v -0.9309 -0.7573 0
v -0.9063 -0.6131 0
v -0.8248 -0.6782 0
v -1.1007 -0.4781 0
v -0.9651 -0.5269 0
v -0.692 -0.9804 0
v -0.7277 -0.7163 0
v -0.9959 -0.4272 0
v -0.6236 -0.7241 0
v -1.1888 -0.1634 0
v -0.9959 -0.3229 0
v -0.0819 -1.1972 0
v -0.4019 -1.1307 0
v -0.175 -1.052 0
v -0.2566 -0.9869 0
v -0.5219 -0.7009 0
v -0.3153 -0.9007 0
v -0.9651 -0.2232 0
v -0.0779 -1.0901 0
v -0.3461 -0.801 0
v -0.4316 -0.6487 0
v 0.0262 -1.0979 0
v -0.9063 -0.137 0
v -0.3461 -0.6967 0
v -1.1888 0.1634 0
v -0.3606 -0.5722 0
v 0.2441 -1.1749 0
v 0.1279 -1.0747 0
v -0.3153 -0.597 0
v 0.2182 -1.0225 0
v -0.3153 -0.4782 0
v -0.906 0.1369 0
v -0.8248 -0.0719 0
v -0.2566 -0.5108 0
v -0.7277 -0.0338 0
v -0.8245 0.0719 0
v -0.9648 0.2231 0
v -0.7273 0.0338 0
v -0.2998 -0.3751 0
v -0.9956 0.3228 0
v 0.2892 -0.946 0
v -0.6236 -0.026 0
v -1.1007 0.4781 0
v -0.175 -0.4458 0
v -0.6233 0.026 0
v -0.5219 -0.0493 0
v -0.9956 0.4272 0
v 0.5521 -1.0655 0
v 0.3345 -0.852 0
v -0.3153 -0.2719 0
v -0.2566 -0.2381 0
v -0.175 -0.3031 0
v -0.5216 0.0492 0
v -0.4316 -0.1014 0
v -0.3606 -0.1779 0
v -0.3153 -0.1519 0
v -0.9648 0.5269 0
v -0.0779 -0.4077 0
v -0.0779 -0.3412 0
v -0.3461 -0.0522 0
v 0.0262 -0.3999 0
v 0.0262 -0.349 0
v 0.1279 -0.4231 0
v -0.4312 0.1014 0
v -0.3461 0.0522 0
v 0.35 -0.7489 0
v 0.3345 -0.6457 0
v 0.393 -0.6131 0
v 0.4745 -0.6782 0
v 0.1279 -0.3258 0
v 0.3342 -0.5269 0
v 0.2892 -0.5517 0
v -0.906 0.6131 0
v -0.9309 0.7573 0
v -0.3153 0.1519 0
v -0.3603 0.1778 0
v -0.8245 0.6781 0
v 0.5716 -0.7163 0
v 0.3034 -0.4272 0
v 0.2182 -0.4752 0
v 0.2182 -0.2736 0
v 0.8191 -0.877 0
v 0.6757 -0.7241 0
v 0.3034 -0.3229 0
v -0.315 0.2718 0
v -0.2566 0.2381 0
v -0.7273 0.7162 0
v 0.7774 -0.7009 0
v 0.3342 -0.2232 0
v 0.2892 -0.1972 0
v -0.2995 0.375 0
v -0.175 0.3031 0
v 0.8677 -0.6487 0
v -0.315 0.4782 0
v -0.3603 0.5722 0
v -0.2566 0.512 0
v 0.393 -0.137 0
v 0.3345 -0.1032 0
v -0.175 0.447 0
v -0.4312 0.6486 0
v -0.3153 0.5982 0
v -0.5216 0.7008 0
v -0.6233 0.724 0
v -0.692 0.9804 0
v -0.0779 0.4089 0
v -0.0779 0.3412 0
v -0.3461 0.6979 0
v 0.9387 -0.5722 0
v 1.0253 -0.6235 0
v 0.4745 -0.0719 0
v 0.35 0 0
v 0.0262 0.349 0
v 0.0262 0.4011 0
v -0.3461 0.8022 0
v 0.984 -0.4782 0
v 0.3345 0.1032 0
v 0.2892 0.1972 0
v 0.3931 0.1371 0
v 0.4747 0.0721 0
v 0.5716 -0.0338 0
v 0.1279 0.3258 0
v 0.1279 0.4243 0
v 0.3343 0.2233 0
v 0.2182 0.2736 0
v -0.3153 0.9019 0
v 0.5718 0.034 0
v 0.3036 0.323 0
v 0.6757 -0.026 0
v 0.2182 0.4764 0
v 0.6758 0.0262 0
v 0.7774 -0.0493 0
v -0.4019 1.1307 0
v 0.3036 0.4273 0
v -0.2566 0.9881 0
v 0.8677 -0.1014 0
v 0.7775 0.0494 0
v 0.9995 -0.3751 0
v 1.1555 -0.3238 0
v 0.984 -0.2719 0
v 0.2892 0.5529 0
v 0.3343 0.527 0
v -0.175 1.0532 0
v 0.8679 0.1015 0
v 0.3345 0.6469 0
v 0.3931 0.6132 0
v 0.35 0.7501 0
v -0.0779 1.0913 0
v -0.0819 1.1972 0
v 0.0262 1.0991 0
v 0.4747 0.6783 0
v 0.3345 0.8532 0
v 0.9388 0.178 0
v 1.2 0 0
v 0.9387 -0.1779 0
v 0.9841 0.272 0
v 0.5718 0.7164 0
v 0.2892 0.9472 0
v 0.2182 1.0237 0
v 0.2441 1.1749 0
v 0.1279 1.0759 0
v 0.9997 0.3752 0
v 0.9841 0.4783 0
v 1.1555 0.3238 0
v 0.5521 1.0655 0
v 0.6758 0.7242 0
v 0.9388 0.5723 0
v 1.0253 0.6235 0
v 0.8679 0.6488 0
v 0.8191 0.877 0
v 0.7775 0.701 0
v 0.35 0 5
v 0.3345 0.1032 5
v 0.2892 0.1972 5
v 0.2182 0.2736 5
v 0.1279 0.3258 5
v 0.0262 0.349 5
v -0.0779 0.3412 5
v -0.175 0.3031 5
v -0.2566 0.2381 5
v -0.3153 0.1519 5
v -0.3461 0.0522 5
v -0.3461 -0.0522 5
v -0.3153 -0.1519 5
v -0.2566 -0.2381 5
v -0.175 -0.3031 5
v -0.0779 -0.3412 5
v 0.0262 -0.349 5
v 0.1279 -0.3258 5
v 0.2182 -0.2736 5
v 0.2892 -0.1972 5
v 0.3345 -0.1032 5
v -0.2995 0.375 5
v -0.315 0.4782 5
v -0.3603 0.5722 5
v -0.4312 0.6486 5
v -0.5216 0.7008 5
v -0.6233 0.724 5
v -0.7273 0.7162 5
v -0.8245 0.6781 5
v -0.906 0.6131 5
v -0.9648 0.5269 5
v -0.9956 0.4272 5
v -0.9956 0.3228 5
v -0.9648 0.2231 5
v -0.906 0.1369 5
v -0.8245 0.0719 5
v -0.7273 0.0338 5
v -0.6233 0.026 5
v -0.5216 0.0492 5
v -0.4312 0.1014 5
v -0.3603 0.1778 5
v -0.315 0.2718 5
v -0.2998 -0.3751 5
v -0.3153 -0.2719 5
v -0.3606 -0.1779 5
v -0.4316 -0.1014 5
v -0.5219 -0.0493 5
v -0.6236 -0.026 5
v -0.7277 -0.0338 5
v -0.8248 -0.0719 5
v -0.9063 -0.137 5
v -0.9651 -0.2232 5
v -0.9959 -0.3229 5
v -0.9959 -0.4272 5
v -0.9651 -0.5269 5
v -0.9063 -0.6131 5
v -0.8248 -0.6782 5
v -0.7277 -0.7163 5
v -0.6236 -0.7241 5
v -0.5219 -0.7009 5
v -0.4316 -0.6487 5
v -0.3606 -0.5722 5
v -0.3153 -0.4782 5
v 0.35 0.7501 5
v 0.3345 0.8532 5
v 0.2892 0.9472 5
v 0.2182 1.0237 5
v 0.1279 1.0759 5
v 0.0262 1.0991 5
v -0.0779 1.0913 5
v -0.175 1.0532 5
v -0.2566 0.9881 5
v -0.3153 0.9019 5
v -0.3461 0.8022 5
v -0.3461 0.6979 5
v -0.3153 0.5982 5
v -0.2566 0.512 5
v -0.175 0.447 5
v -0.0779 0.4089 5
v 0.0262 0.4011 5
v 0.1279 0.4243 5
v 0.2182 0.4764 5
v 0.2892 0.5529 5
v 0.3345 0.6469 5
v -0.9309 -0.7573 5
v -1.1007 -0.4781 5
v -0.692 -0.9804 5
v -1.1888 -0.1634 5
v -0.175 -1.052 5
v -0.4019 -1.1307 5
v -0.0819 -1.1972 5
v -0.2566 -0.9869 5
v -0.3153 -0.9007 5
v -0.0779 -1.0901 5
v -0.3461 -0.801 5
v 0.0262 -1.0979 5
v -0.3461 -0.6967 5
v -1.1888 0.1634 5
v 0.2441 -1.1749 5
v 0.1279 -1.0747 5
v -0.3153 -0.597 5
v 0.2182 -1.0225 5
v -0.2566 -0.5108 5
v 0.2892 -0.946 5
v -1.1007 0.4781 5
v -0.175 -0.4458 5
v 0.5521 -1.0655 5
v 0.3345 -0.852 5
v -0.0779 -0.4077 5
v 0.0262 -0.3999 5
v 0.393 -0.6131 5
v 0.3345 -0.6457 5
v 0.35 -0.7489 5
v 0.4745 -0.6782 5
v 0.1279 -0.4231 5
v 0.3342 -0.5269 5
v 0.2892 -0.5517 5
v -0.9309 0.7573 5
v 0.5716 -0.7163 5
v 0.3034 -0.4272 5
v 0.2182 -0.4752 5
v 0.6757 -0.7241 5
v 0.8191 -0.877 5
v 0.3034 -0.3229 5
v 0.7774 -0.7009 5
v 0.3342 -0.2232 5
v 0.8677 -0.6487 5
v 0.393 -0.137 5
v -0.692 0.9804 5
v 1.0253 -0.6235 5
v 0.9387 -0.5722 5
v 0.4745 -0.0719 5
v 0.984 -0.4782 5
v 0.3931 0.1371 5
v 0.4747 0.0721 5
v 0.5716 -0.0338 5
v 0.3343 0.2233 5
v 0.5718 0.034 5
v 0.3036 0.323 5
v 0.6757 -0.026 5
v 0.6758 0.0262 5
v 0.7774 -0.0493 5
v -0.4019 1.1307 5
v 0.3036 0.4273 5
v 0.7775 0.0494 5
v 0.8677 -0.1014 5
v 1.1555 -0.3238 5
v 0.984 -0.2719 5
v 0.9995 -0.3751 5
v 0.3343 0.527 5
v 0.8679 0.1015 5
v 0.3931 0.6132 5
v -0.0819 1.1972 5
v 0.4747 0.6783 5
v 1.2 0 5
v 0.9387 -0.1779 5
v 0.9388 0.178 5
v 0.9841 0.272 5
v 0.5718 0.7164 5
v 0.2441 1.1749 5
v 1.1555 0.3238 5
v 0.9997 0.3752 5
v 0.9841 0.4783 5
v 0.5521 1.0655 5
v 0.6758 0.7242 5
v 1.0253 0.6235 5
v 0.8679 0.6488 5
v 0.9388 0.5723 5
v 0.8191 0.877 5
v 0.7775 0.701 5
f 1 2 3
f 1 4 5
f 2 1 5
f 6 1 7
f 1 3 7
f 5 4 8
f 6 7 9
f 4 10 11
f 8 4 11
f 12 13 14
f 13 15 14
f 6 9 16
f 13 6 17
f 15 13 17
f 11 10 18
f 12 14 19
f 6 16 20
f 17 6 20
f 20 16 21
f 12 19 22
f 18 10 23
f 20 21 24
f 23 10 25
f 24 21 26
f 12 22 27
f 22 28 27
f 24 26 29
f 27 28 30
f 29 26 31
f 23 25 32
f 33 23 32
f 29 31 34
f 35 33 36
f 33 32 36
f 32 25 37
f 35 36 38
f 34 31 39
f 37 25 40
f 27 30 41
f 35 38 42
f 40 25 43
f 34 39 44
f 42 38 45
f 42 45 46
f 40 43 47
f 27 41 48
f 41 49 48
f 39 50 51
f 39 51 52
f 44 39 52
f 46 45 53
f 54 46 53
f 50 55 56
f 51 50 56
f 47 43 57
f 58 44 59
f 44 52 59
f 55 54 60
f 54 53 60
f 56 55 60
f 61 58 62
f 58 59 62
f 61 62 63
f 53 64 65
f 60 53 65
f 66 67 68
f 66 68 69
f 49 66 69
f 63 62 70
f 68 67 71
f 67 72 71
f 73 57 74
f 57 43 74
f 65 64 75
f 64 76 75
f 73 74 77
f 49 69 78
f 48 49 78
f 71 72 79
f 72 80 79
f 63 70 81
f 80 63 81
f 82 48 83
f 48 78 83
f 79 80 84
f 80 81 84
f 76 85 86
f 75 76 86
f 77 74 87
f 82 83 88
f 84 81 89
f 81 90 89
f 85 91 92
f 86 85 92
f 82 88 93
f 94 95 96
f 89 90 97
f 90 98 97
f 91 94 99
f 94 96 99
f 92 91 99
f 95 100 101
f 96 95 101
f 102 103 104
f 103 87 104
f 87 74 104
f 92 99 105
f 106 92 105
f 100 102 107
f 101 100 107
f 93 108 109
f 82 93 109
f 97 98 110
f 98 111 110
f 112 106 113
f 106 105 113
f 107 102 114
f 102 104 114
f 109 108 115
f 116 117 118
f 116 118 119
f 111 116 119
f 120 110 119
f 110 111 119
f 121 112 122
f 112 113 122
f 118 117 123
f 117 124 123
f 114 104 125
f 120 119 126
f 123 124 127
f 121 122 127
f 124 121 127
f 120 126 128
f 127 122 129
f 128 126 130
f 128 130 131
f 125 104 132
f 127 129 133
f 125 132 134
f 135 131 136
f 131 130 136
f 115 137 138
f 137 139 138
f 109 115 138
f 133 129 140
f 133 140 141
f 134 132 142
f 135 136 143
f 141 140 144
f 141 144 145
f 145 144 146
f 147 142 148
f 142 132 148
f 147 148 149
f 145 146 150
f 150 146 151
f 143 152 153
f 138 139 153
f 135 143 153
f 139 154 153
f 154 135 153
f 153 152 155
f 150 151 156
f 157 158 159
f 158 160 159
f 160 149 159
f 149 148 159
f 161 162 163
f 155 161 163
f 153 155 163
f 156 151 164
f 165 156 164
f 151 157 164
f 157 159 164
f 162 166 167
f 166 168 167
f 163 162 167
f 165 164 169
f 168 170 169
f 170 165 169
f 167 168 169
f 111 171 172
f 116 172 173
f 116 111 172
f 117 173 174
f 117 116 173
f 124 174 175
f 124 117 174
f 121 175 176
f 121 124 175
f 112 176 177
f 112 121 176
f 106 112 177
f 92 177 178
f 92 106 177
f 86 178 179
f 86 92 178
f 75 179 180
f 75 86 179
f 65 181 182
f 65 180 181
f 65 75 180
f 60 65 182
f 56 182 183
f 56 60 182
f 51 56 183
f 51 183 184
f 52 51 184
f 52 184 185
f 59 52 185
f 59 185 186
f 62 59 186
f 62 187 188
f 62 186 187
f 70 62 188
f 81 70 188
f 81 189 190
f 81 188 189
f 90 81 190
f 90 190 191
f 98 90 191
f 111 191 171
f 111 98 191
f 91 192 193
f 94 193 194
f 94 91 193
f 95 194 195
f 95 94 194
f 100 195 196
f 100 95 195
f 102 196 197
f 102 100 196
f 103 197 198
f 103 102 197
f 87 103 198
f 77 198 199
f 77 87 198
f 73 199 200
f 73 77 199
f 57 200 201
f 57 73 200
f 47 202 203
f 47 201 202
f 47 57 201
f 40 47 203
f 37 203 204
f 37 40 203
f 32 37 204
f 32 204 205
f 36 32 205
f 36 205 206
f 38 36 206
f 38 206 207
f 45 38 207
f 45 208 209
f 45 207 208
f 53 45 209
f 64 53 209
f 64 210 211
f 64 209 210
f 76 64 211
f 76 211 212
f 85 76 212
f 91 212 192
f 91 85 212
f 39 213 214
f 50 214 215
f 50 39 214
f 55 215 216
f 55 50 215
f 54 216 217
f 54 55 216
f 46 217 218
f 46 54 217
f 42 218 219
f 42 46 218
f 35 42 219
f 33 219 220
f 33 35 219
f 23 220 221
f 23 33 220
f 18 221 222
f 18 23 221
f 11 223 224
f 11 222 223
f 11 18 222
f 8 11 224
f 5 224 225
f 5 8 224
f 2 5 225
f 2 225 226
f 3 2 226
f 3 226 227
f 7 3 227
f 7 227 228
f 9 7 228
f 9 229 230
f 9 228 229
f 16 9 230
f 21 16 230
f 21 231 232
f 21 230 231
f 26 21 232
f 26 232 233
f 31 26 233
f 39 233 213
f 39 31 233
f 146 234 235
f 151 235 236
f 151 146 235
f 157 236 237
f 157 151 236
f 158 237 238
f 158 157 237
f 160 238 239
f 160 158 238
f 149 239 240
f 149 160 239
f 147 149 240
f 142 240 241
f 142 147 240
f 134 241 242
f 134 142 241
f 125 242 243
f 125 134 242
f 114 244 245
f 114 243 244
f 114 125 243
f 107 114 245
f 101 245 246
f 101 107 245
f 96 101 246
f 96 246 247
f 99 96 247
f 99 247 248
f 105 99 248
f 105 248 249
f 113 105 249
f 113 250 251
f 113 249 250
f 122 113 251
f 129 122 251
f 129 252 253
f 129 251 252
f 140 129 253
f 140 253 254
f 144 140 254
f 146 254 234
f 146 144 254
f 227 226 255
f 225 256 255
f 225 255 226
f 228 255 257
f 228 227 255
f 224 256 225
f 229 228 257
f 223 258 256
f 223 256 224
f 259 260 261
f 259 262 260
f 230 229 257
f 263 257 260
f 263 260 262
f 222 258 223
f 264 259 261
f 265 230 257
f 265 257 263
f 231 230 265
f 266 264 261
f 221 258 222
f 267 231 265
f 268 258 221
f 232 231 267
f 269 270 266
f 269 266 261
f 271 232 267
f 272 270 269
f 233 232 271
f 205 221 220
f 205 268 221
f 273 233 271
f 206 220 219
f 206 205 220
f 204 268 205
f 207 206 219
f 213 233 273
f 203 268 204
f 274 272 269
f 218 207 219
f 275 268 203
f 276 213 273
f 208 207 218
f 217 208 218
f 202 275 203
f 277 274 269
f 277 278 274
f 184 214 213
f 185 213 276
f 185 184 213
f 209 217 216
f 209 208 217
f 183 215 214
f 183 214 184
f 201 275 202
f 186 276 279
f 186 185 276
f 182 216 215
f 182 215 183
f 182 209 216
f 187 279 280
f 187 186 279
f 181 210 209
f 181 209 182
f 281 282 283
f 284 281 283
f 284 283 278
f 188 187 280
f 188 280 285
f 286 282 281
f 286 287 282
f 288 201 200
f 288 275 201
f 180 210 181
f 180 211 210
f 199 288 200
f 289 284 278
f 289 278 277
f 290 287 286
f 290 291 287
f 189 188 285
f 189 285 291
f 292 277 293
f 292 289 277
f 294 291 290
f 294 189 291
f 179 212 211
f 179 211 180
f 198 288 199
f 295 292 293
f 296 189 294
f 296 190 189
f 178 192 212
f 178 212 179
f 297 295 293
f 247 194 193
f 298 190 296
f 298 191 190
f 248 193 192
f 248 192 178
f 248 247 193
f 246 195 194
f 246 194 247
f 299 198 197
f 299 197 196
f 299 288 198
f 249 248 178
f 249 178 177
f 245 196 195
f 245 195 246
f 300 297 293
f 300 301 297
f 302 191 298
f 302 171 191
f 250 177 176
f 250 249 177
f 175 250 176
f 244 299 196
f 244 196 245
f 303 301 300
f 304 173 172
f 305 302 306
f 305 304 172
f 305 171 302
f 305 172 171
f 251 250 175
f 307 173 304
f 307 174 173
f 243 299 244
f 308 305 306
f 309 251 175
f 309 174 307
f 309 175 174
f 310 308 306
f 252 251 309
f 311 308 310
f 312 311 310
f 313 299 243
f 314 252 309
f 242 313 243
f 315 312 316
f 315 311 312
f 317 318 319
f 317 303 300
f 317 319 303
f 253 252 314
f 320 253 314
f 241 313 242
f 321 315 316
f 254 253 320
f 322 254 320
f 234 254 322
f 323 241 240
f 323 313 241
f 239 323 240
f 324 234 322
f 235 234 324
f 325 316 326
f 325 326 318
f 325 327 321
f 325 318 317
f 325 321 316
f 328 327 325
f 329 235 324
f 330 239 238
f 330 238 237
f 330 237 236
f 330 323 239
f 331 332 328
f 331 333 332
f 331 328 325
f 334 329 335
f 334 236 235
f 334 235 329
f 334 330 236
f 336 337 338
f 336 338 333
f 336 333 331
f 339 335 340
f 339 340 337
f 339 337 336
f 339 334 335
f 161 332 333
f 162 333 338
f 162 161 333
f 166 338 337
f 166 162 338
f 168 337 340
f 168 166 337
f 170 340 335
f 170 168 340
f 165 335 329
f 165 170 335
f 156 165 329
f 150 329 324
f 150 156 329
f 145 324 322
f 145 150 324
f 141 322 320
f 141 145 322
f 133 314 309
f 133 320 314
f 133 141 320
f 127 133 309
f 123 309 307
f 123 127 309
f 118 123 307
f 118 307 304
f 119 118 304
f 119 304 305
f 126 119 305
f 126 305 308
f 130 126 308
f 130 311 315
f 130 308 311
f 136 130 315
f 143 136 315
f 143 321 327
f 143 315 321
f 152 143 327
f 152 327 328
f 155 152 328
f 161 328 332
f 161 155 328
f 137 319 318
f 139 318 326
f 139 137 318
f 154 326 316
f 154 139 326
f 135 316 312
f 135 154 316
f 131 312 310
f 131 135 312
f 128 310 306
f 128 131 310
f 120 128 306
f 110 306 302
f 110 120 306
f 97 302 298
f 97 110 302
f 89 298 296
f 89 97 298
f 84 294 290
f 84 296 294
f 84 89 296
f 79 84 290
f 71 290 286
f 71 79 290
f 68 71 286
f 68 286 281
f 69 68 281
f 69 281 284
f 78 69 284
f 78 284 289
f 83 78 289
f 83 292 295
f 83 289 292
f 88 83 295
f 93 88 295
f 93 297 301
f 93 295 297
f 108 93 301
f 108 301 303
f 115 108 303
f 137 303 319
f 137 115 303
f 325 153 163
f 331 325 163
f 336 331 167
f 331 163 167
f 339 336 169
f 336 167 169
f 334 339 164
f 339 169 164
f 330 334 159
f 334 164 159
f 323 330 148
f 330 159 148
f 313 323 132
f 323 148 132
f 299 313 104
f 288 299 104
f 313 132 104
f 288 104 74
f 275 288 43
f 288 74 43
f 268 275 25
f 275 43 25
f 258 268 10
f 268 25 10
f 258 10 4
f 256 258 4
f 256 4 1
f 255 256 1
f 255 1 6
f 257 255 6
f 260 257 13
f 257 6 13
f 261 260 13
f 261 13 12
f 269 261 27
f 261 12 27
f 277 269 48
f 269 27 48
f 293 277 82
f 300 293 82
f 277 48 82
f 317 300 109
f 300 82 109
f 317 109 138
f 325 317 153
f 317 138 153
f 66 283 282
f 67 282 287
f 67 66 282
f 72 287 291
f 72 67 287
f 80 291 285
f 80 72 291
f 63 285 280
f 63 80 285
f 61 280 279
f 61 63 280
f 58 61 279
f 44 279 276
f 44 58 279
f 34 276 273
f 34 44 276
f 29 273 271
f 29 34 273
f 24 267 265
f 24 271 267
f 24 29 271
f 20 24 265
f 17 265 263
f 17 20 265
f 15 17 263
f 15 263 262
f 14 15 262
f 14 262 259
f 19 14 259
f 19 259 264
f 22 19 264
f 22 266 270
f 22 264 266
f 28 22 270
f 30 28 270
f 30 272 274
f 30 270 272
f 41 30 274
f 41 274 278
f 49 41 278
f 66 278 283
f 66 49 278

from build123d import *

# Parameters (mm, degrees)
F1_R     = 1.2
F2_DEPTH = 5
F0_R     = 0.35
F3_DEPTH = 5.001


with BuildPart() as f2:
    # F1 (on Top) → F2 (new body)
    with BuildSketch(Plane.XY):
        Circle(F1_R)
    extrude(amount=F2_DEPTH)

    # F0 (on Top) → F3 (cut, through all)
    with BuildSketch(Plane.XY):
        Circle(F0_R)
        with Locations((0, 0.750083)):
            Circle(F0_R)
        with Locations((0.649655, 0.37518)):
            Circle(F0_R)
        with Locations((0.649525, -0.375058)):
            Circle(F0_R)
        with Locations((0, -0.748877)):
            Circle(F0_R)
        with Locations((-0.649772, -0.375058)):
            Circle(F0_R)
        with Locations((-0.649465, 0.375007)):
            Circle(F0_R)
    extrude(amount=F3_DEPTH, mode=Mode.SUBTRACT)


solid = f2.part
